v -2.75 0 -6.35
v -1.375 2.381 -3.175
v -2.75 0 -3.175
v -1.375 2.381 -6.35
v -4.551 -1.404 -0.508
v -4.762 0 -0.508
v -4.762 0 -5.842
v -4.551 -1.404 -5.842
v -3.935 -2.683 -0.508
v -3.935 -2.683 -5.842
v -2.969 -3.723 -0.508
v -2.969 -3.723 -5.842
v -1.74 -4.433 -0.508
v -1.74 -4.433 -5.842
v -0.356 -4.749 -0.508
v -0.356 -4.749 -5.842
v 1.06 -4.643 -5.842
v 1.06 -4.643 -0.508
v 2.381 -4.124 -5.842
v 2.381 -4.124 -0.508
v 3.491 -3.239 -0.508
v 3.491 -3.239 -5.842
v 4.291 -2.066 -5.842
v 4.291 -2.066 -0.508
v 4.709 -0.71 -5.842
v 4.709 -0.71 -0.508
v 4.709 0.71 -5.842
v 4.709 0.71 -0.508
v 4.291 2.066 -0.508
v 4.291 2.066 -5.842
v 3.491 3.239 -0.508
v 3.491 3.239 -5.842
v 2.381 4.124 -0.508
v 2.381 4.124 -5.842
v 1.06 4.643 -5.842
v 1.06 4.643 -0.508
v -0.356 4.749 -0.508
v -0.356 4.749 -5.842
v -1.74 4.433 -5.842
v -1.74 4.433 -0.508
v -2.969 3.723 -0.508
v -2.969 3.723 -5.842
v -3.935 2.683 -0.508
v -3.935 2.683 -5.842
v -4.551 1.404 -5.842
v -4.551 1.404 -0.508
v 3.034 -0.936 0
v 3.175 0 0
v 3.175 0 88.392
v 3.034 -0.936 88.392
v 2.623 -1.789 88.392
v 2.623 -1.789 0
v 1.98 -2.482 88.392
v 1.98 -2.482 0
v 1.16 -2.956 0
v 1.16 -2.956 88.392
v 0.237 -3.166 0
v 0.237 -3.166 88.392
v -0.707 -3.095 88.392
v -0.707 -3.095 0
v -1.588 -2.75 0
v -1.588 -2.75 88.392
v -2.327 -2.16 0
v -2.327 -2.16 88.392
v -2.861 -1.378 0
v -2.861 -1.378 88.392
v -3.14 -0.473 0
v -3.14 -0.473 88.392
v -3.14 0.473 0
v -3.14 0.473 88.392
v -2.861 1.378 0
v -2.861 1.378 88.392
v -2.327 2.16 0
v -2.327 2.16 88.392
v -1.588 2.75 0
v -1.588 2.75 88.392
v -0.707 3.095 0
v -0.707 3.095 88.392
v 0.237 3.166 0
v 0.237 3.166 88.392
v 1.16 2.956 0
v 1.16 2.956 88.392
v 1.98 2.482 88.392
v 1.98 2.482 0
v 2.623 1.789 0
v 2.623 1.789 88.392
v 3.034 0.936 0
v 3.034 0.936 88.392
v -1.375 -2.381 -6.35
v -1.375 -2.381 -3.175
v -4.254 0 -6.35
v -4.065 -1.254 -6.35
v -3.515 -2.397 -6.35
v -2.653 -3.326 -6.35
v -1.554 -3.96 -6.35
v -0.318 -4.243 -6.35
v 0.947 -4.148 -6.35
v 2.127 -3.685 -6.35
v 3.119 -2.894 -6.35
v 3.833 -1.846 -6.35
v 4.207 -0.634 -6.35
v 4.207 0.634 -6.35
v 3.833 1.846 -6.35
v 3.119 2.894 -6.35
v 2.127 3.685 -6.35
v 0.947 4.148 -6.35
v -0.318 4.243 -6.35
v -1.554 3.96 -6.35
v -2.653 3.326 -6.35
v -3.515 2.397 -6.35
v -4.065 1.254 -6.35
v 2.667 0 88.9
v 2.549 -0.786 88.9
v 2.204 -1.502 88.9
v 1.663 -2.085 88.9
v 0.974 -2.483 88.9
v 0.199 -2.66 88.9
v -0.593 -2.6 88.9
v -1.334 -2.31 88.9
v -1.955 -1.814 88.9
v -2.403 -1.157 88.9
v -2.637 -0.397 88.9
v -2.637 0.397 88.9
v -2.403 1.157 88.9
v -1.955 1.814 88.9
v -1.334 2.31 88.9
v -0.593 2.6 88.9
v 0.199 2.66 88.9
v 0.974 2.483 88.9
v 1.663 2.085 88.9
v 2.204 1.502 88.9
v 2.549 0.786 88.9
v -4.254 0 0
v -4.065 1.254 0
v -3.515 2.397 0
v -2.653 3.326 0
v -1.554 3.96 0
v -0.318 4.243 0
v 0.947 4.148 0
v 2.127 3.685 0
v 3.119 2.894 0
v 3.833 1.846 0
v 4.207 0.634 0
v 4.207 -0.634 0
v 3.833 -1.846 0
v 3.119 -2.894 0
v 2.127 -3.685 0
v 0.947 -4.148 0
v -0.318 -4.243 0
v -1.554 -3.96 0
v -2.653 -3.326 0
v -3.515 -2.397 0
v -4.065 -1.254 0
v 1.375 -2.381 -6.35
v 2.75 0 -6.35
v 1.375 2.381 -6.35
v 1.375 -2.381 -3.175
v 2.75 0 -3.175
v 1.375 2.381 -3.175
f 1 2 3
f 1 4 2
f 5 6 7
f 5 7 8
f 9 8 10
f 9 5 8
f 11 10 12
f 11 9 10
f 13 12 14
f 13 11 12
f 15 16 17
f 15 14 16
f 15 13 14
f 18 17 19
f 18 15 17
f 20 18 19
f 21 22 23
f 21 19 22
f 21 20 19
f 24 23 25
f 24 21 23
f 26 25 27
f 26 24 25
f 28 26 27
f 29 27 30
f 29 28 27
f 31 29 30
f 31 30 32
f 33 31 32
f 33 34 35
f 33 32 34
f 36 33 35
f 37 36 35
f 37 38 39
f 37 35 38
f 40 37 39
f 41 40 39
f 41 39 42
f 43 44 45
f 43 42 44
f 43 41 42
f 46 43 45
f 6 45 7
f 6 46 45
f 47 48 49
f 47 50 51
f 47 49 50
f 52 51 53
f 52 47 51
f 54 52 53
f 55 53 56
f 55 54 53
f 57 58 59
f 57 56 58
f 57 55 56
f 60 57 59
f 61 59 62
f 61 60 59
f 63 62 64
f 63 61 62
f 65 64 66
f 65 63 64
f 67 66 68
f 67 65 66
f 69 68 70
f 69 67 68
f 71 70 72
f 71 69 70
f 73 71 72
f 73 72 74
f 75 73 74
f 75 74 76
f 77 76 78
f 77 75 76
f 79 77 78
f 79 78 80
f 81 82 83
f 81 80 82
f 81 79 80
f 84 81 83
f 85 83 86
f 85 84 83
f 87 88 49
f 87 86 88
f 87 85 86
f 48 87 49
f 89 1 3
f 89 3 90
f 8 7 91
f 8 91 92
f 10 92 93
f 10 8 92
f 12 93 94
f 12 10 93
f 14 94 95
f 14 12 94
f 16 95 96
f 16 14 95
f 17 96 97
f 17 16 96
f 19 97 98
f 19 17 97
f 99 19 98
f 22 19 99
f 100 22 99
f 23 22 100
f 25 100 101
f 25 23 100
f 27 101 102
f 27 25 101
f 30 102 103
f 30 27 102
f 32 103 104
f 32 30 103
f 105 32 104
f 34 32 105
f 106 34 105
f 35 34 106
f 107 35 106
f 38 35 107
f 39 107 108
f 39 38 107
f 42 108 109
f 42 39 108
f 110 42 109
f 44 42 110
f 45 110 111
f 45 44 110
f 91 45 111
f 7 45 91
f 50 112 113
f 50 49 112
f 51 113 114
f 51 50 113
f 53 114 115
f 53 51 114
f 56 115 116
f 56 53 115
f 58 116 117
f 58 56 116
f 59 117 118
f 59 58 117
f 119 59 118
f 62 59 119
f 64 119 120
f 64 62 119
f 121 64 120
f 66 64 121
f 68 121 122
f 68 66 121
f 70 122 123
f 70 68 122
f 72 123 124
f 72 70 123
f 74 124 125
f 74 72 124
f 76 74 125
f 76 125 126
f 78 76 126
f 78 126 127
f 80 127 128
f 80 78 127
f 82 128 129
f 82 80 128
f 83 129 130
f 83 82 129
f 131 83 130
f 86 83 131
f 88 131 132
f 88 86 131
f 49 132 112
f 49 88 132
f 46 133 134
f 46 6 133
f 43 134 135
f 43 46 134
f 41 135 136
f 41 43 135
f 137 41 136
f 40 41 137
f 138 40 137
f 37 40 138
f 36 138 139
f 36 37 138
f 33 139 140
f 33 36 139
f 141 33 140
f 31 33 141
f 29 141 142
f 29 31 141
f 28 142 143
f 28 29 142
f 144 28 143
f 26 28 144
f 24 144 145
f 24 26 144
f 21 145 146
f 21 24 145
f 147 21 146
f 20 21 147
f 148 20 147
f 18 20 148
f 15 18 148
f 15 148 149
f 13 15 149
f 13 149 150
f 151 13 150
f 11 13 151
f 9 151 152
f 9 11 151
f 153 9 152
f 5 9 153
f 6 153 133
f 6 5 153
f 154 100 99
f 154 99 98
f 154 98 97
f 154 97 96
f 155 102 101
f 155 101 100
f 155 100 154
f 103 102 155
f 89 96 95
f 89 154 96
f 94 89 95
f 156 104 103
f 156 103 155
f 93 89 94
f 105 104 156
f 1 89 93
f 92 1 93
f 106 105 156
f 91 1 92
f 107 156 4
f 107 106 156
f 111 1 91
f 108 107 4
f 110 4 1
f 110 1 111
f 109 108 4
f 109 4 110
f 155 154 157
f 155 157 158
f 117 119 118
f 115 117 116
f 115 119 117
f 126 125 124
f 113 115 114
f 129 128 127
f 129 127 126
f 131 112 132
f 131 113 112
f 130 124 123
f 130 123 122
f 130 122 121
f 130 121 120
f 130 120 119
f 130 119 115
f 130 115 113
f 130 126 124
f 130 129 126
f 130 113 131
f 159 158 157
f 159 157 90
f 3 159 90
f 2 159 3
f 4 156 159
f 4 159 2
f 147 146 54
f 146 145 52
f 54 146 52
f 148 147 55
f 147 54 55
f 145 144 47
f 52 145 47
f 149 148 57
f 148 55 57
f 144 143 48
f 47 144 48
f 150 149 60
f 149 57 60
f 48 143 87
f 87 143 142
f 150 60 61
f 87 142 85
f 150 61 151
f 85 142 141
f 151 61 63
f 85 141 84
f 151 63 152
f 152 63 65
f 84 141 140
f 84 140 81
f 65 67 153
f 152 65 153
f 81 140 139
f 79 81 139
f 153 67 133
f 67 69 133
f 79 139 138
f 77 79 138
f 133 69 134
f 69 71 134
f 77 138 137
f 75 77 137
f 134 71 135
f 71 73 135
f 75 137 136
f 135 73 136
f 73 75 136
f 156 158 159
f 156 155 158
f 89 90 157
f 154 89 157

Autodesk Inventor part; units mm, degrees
ref_plane "YZ Plane" through (0, 0, 0) normal (1, 0, 0) x (0, 1, 0)
ref_plane "XZ Plane" through (0, 0, 0) normal (0, 1, 0) x (-1, 0, 0)
ref_plane "XY Plane" through (0, 0, 0) normal (0, 0, 1) x (1, 0, 0)
sketch "Sketch1" plane through (0, 0, 0) normal (0, 0, 1) x (1, 0, 0)
  circle A0 centre (0, 0) radius 3.175
  dimension "d0" = 6.35
extrude "Extrusion1" add sketch "Sketch1" along normal blind 88.9
sketch "Sketch2" plane through (0, 0, 0) normal (0, 0, -1) x (-1, 0, 0)
  circle A0 centre (0, 0) radius 3.175 projected
  circle A1 centre (0, 0) radius 4.7625
  dimension "d3" = 9.525
extrude "Extrusion2" add sketch "Sketch2" along normal blind 6.35 contours A0 | A1
sketch "Sketch3" plane through (0, 0, -6.35) normal (0, 0, -1) x (-1, 0, 0)
  circle A0 centre (0, 0) radius 4.7625 projected
  line L0 (-1.3748, 2.3812) -> (1.3748, 2.3813)
  line L1 (1.3748, 2.3813) -> (2.7496, 0)
  line L2 (2.7496, 0) -> (1.3748, -2.3812)
  line L3 (1.3748, -2.3812) -> (-1.3748, -2.3812)
  line L4 (-1.3748, -2.3812) -> (-2.7496, 0)
  line L5 (-2.7496, 0) -> (-1.3748, 2.3812)
  dimension "d6" = 4.7625
extrude "Extrusion3" cut sketch "Sketch3" against normal blind 3.175 contours L0 L1 L2 L3 L4 L5
chamfer "Chamfer1" distance 0.508 angle 45 3 edges at (-3.175, 0, 88.9) (4.7625, 0, 0) (4.7625, 0, -6.35)
thread "Thread1" size "1/4-20 UNC" class "2A" standard "ANSI Unified Screw Threads" length 25.4
properties part number "14-20 x750" material "Steel"
